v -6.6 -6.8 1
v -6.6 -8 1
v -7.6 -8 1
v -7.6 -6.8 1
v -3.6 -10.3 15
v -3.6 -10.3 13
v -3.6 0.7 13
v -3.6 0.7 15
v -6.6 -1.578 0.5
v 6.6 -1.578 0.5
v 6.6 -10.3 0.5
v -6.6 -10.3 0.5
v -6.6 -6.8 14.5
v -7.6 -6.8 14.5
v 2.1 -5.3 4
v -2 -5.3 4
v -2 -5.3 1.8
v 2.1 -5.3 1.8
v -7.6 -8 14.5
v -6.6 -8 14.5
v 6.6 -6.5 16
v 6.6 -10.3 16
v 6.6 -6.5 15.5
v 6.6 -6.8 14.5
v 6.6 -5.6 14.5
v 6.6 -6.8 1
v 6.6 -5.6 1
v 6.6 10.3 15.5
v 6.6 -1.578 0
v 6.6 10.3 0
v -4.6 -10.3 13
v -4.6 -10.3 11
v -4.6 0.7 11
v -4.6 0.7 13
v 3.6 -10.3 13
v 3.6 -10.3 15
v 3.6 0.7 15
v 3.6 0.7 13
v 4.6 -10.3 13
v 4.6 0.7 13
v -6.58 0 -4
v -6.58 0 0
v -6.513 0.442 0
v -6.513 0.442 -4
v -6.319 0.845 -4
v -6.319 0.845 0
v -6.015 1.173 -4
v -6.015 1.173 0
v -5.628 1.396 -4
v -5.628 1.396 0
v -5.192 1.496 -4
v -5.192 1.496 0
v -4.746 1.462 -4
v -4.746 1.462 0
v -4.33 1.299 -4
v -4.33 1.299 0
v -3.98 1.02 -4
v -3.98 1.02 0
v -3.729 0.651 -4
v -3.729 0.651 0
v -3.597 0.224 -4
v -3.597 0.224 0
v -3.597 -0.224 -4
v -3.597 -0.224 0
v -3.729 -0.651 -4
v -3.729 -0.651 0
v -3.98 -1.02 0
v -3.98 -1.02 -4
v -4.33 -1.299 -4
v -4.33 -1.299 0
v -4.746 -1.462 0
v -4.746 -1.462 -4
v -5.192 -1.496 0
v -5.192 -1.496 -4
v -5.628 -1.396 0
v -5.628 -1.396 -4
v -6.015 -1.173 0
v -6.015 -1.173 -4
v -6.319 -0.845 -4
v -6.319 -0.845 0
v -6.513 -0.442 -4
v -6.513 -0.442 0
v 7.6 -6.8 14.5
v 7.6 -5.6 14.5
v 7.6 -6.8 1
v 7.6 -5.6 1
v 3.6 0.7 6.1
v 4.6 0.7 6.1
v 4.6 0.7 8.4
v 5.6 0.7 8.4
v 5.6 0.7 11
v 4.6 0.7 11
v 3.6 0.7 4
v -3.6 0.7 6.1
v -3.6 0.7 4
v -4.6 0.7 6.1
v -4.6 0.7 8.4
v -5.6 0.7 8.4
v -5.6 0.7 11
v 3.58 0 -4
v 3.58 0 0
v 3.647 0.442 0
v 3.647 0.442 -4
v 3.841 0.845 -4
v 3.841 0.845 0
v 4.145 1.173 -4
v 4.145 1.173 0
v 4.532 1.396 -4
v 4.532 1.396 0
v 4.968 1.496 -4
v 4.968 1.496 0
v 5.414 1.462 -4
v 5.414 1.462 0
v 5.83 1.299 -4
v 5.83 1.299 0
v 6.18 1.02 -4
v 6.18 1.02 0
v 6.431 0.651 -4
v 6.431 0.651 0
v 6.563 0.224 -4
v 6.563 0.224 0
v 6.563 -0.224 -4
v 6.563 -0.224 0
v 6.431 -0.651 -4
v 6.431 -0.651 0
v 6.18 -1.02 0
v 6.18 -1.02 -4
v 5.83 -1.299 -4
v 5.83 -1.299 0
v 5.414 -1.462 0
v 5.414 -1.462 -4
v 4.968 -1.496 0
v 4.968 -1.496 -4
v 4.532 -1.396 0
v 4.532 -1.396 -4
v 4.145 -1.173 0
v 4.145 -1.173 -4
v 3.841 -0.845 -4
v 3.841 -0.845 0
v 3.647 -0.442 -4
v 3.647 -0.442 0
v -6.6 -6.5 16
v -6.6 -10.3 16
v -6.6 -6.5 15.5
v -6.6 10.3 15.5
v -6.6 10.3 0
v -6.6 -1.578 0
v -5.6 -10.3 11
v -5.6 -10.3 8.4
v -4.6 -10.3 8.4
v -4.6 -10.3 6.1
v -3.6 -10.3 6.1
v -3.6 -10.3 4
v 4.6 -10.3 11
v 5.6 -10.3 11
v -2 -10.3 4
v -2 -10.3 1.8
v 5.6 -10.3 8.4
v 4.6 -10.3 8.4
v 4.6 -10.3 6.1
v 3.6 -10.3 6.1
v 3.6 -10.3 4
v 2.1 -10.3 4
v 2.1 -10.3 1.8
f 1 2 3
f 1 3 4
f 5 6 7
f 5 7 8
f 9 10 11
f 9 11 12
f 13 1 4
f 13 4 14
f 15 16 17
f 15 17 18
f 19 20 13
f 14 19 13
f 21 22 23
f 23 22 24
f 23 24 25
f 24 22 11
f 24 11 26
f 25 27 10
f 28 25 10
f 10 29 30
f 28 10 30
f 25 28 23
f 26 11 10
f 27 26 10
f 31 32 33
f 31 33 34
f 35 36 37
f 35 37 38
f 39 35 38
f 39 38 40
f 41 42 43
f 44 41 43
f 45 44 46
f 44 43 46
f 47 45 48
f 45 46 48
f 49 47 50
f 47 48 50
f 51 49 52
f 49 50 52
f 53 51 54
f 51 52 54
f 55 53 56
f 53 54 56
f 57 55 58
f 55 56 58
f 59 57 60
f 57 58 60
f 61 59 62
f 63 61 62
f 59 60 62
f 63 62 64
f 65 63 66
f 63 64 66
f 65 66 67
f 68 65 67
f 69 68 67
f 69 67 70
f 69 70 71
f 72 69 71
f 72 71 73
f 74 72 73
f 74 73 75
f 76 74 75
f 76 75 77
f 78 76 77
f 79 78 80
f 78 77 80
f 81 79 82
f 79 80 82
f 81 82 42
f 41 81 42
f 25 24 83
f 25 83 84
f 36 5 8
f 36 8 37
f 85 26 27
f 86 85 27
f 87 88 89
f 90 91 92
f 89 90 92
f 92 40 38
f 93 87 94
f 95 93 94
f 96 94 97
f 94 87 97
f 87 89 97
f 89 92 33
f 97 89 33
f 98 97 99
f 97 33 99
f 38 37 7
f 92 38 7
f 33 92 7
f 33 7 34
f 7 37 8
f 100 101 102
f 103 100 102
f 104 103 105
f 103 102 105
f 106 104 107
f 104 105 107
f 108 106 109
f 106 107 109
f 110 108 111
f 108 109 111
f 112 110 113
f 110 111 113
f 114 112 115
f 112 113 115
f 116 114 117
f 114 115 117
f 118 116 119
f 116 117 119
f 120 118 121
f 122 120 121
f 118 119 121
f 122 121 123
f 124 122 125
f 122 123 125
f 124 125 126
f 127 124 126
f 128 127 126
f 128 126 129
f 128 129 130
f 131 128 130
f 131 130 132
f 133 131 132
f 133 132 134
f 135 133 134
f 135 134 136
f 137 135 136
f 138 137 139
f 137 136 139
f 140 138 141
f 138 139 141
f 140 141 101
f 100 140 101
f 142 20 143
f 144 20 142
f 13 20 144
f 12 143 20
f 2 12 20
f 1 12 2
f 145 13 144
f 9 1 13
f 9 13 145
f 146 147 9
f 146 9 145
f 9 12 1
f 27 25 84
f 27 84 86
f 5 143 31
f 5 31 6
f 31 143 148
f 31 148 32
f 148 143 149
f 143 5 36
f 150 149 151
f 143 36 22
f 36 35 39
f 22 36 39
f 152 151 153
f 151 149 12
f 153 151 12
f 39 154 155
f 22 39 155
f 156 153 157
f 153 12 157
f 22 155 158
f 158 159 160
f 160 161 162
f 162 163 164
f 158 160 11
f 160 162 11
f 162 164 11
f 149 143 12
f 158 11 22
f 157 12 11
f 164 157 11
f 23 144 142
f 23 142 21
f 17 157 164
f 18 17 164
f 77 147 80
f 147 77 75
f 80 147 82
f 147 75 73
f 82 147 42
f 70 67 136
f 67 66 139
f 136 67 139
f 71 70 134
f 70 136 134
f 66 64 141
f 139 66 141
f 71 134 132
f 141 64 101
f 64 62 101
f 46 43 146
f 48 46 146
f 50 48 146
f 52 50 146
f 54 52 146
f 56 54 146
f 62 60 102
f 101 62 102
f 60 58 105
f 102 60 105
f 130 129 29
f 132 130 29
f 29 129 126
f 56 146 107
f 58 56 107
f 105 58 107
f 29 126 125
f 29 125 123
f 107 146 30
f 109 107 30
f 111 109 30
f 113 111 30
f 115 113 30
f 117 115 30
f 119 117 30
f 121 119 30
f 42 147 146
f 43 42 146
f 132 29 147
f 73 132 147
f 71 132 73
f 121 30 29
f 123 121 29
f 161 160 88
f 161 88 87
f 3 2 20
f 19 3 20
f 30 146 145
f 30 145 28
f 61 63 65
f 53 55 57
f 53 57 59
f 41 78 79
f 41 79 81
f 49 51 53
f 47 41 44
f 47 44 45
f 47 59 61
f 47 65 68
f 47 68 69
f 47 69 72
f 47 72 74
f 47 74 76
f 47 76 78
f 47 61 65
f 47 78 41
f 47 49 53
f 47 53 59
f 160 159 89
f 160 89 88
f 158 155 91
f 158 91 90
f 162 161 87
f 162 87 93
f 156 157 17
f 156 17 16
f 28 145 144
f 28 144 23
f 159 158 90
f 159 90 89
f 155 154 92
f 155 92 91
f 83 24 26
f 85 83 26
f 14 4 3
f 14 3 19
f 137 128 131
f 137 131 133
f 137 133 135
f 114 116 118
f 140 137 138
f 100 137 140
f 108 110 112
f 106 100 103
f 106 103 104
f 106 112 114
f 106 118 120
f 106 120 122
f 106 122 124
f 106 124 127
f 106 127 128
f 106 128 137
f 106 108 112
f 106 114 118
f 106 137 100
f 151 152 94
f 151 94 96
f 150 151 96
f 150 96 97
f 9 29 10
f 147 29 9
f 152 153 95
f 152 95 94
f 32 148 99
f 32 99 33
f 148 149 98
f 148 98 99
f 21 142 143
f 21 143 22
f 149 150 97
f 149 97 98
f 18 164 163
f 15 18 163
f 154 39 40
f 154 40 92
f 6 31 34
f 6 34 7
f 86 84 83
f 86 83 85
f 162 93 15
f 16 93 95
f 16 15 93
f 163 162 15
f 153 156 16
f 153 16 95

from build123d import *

# Parameters (mm, degrees)
SKETCH1_W           = 13.2
SKETCH1_H           = 20.6
BOSS_EXTRUDE1_DEPTH = 15.5
SKETCH2_R           = 1.5
BOSS_EXTRUDE2_DEPTH = 4
SKETCH3_W           = 13.2
SKETCH3_H           = 3.8
BOSS_EXTRUDE3_DEPTH = 0.5
CUT_EXTRUDE1_DEPTH  = 11
SKETCH5_W           = 4.1
SKETCH5_H           = 2.2
CUT_EXTRUDE2_DEPTH  = 5
SKETCH6_W           = 13.5
SKETCH6_H           = 1.2
BOSS_EXTRUDE5_DEPTH = 1
SKETCH7_W           = 13.5
SKETCH7_H           = 1.2
BOSS_EXTRUDE6_DEPTH = 1
SKETCH8_W           = 13.2
SKETCH8_H           = 8.722289783
CUT_EXTRUDE3_DEPTH  = 0.5


with BuildPart() as part:
    # Sketch1 → Boss-Extrude1 (new body)
    with BuildSketch(Plane.XY):
        Rectangle(SKETCH1_W, SKETCH1_H)
    extrude(amount=BOSS_EXTRUDE1_DEPTH)

    # Sketch2 → Boss-Extrude2 (add)
    with BuildSketch(Plane(origin=(0, 0, 0), x_dir=(-1, 0, 0), z_dir=(0, 0, -1))):
        with Locations((5.08, 0)):
            Circle(SKETCH2_R)
        with Locations((-5.08, 0)):
            Circle(SKETCH2_R)
    extrude(amount=BOSS_EXTRUDE2_DEPTH)

    # Sketch3 → Boss-Extrude3 (add)
    with BuildSketch(Plane.XY.offset(15.5)):
        with Locations((0, -8.4)):
            Rectangle(SKETCH3_W, SKETCH3_H)
    extrude(amount=BOSS_EXTRUDE3_DEPTH)

    # Sketch4 → Cut-Extrude1 (cut)
    with BuildSketch(Plane.XZ.offset(10.3)):
        Polygon((-3.6, 15), (3.6, 15), (3.6, 13), (4.6, 13), (4.6, 11), (5.6, 11), (5.6, 8.4), (4.6, 8.4), (4.6, 6.1), (3.6, 6.1), (3.6, 4), (-3.6, 4), (-3.6, 6.1), (-4.6, 6.1), (-4.6, 8.4), (-5.6, 8.4), (-5.6, 11), (-4.6, 11), (-4.6, 13), (-3.6, 13), align=None)
    extrude(amount=-CUT_EXTRUDE1_DEPTH, mode=Mode.SUBTRACT)

    # Sketch5 → Cut-Extrude2 (cut)
    with BuildSketch(Plane.XZ.offset(10.3)):
        with Locations((0.05, 2.9)):
            Rectangle(SKETCH5_W, SKETCH5_H)
    extrude(amount=-CUT_EXTRUDE2_DEPTH, mode=Mode.SUBTRACT)

    # Sketch6 → Boss-Extrude5 (add)
    with BuildSketch(Plane.ZY.offset(6.6)):
        with Locations((7.75, -7.4)):
            Rectangle(SKETCH6_W, SKETCH6_H)
    extrude(amount=BOSS_EXTRUDE5_DEPTH)

    # Sketch7 → Boss-Extrude6 (add)
    with BuildSketch(Plane(origin=(6.6, 0, 0), x_dir=(0, 0, -1), z_dir=(1, 0, 0))):
        with Locations((-7.75, -6.2)):
            Rectangle(SKETCH7_W, SKETCH7_H)
    extrude(amount=BOSS_EXTRUDE6_DEPTH)

    # Sketch8 → Cut-Extrude3 (cut)
    with BuildSketch(Plane(origin=(0, 0, 0), x_dir=(-1, 0, 0), z_dir=(0, 0, -1))):
        with Locations((0, -5.938855109)):
            Rectangle(SKETCH8_W, SKETCH8_H)
    extrude(amount=-CUT_EXTRUDE3_DEPTH, mode=Mode.SUBTRACT)


solid = part.part
